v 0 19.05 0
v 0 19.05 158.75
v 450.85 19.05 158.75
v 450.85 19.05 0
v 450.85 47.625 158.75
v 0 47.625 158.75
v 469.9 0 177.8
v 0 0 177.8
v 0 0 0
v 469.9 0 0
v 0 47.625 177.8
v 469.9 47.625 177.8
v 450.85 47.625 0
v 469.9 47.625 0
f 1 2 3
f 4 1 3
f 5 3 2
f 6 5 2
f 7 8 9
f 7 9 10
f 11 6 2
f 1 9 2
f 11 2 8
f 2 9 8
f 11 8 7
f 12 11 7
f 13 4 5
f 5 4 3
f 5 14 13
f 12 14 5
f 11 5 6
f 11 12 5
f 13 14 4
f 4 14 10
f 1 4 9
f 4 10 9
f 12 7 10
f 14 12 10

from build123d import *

# Parameters (mm, degrees)
F0_W     = 469.9
F0_H     = 177.8
F1_DEPTH = 19.05
F3_DEPTH = 28.575


with BuildPart() as f1:
    # F0 (on Front) → F1 (new body)
    with BuildSketch(Plane.XZ):
        with Locations((234.95, 88.9)):
            Rectangle(F0_W, F0_H)
    extrude(amount=-F1_DEPTH)

    # F2 (on face) → F3 (join)
    with BuildSketch(Plane(origin=(0, 19.05, 0), x_dir=(-1, 0, 0), z_dir=(0, 1, 0))):
        Polygon((-469.9, 177.8), (-469.9, 0), (-450.85, 0), (-450.85, 158.75), (0, 158.75), (0, 177.8), align=None)
    extrude(amount=F3_DEPTH)


solid = f1.part
